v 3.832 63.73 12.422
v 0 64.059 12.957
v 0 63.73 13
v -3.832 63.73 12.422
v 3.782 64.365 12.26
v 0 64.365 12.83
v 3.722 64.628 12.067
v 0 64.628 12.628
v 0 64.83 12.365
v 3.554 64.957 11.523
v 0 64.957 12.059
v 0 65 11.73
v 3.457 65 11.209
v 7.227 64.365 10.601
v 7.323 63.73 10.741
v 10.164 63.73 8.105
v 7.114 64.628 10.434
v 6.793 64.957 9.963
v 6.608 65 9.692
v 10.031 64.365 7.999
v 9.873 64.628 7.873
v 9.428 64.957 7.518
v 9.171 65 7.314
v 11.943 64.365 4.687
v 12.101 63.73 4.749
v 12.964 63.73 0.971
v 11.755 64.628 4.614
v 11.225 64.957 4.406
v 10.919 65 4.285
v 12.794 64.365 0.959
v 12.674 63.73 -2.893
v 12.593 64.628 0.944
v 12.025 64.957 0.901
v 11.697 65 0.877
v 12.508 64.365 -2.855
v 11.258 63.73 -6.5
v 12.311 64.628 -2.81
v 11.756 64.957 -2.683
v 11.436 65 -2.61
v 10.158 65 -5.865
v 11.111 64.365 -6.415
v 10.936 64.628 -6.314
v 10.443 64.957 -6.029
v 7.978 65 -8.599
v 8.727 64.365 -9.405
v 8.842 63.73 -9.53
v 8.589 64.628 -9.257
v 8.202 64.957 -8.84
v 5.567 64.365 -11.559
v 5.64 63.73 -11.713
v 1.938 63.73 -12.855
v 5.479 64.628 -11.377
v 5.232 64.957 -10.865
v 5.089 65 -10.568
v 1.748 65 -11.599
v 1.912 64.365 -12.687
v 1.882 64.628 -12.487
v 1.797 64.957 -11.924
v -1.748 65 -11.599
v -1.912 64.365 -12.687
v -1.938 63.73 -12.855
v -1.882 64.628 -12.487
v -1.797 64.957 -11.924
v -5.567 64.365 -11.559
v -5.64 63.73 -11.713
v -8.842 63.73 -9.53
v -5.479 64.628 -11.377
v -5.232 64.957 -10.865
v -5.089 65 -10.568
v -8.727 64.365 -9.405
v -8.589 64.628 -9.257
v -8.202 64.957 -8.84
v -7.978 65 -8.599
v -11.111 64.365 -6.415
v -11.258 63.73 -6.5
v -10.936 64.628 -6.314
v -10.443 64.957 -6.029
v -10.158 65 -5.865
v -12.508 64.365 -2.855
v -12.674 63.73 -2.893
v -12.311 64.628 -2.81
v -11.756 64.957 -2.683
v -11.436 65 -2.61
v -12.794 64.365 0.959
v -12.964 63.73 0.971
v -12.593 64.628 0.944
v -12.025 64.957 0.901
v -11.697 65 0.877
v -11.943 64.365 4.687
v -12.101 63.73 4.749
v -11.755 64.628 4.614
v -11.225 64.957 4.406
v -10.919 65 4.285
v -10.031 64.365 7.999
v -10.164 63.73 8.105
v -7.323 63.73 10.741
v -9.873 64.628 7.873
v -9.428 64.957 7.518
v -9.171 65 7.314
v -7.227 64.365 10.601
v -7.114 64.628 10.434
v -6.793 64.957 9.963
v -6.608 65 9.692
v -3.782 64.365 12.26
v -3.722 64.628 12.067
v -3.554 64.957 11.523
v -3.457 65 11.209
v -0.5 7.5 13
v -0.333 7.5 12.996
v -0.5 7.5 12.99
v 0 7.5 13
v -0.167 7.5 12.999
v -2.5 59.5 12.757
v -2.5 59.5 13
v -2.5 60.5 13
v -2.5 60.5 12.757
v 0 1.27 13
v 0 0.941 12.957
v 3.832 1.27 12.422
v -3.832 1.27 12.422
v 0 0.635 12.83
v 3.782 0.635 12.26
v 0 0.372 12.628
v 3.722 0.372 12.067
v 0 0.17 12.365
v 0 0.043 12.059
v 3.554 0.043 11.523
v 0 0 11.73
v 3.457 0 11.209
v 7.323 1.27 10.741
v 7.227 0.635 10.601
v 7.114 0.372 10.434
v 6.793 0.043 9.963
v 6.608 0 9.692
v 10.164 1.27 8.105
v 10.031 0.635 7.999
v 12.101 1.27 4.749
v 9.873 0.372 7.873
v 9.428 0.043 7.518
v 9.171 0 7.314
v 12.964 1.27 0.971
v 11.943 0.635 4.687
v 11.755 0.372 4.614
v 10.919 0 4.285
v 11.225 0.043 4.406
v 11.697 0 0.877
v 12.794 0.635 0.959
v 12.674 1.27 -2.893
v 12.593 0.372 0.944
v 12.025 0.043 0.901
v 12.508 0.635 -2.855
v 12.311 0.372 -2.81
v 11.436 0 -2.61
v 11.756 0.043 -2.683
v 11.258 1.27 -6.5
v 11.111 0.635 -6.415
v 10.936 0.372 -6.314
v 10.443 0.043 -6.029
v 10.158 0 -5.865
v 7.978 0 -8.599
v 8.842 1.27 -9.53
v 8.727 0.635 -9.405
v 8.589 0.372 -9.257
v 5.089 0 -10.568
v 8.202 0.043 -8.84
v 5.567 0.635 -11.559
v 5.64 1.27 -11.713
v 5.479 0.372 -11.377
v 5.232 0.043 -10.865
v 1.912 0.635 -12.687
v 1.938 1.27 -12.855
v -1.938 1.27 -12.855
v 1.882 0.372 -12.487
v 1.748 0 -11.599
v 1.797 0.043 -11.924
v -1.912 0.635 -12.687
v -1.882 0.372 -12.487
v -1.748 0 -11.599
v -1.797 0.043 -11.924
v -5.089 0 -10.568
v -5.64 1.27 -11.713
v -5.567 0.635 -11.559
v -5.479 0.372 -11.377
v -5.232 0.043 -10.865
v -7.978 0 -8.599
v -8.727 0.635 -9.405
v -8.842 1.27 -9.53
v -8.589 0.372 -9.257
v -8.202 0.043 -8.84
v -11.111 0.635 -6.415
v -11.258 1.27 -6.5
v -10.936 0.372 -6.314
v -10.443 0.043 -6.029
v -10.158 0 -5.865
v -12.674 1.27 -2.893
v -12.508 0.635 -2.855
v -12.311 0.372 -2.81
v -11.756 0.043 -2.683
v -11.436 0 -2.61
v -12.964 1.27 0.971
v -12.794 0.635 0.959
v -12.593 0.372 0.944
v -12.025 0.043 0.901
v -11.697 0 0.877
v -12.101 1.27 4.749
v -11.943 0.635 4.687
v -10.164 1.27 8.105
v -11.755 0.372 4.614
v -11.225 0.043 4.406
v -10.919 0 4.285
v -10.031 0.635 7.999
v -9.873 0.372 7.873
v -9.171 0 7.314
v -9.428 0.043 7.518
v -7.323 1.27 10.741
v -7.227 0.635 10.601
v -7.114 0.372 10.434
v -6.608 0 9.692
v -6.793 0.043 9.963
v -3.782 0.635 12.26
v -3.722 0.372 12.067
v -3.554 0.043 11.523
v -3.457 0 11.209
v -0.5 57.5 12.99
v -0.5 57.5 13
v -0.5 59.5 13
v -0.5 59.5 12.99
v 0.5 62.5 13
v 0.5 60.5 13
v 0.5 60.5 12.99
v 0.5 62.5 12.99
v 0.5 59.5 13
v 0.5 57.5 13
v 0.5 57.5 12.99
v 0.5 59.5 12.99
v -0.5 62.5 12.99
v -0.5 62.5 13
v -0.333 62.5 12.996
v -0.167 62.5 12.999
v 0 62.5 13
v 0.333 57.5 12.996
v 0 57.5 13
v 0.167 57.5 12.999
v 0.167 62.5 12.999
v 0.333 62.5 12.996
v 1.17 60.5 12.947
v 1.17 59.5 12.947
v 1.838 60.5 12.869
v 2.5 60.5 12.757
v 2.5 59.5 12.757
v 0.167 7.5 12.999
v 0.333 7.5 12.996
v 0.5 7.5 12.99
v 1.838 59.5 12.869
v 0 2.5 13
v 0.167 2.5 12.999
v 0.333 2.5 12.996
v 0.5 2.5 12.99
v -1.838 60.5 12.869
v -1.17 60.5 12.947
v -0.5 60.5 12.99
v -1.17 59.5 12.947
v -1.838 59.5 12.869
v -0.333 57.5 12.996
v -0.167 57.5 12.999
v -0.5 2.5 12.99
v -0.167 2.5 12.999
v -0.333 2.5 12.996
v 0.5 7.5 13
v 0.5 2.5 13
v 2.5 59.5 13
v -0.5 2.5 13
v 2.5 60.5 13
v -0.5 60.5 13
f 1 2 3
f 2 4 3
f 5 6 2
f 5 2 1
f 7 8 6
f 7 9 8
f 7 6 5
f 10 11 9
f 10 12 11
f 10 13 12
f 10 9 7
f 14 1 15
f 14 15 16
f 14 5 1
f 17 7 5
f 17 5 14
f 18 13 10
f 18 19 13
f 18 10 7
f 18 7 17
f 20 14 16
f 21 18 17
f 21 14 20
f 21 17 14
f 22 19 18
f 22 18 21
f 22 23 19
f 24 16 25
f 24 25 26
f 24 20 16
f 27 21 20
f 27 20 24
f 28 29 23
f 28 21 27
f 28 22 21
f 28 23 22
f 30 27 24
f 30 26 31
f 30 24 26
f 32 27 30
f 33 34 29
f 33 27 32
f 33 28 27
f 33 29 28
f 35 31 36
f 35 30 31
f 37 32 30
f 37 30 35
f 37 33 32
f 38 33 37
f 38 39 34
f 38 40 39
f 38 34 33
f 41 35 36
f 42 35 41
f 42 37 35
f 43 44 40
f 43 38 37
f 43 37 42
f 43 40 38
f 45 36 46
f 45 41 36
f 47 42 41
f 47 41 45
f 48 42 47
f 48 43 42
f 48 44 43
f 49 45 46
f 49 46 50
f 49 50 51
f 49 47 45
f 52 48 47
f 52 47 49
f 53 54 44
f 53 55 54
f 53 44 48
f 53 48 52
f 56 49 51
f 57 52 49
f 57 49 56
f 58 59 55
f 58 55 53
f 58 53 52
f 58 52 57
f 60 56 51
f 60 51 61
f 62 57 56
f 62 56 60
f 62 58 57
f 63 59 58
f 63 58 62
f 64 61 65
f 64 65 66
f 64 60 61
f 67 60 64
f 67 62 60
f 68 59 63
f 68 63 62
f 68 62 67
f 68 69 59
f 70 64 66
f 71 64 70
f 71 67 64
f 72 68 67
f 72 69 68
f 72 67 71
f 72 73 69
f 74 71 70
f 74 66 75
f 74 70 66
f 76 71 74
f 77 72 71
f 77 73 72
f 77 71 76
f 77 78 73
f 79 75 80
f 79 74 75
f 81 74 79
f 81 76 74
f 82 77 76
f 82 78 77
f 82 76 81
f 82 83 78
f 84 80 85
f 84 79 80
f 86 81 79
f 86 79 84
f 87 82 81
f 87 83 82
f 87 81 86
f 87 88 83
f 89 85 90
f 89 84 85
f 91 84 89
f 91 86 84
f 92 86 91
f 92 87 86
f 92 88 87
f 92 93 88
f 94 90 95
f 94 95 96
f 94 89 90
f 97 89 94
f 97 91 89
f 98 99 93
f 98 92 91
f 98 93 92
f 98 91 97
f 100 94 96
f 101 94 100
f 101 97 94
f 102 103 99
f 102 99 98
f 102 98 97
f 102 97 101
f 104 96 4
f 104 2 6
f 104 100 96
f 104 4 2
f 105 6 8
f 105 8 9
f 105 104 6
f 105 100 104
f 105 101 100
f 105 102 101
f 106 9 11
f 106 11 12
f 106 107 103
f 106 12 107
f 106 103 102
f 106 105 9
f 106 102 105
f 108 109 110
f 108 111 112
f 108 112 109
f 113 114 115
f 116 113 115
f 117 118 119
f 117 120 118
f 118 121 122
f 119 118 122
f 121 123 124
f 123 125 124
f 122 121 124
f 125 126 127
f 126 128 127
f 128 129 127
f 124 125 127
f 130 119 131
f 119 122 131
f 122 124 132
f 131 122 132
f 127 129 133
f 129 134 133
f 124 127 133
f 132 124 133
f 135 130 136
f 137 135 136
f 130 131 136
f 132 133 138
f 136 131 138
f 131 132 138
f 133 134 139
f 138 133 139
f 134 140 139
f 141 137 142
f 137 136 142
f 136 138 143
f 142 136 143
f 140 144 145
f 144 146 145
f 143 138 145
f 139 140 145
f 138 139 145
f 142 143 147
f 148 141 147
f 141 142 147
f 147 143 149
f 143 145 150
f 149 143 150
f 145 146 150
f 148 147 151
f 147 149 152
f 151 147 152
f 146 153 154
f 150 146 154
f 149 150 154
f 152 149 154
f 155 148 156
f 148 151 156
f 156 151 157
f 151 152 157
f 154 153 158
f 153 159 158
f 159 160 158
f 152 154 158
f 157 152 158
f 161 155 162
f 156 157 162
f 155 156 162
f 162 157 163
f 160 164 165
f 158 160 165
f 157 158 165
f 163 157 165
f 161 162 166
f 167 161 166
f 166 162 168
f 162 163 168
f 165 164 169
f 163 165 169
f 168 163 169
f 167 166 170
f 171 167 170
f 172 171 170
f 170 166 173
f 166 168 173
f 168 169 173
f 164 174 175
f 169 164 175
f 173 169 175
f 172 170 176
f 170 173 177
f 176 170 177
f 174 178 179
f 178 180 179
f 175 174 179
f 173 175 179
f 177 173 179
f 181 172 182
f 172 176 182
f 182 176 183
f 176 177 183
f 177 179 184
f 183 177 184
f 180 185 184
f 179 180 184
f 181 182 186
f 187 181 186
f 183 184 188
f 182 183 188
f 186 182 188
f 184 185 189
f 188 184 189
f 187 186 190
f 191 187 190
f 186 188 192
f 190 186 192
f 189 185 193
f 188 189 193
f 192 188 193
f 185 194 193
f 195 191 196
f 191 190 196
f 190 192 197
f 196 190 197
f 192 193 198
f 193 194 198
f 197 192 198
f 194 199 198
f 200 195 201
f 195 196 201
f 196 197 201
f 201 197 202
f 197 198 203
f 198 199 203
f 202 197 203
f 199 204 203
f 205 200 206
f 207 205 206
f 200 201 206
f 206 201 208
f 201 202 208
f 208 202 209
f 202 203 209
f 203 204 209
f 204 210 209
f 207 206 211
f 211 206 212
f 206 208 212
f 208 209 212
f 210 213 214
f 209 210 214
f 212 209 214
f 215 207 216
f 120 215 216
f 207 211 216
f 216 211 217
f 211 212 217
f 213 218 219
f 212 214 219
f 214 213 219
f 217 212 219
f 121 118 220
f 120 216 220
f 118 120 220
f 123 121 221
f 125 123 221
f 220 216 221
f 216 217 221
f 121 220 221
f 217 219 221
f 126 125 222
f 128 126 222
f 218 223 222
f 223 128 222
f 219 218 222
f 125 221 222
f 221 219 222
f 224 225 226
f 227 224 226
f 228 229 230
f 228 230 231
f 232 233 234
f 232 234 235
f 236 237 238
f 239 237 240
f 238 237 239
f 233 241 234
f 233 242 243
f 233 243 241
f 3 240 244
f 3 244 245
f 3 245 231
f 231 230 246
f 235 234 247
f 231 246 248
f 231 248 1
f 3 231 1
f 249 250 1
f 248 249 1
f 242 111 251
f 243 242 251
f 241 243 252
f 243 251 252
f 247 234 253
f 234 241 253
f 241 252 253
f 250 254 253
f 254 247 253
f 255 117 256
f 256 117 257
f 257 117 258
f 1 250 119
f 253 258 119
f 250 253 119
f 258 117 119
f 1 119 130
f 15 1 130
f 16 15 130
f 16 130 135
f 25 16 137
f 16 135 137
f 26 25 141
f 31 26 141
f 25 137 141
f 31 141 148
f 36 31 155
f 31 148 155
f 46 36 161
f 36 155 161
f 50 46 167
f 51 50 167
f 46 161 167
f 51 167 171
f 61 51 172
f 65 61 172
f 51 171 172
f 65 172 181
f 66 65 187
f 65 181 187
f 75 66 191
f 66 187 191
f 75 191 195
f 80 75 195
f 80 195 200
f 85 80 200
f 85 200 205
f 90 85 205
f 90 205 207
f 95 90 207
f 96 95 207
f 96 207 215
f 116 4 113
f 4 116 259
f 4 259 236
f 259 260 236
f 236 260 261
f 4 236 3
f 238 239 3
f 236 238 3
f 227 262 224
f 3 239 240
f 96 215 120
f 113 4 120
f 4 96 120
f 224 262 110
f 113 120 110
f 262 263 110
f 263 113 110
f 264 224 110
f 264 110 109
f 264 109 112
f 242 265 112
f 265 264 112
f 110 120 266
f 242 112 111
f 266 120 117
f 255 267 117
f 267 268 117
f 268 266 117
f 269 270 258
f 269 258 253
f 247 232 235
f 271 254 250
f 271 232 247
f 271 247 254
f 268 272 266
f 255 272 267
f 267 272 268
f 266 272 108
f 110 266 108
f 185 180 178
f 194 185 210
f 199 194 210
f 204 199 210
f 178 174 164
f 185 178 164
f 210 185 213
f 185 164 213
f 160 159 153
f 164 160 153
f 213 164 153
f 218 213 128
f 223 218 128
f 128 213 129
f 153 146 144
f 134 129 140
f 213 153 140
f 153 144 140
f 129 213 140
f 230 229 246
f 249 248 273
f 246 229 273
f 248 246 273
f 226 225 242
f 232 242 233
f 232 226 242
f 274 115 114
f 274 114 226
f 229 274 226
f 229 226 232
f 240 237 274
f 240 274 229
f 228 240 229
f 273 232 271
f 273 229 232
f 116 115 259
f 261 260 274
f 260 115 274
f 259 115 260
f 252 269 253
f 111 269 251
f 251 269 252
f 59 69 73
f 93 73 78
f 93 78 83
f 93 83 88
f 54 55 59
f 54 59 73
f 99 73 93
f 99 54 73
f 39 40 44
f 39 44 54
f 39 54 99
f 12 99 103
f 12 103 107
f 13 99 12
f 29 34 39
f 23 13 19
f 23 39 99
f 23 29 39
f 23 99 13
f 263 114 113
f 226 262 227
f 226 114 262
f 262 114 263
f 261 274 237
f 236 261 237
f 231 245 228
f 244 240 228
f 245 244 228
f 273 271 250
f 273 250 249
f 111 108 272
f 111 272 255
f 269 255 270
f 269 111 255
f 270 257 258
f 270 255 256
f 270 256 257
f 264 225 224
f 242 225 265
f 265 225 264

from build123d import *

# Parameters (mm, degrees)
SKETCH1_R           = 13
BOSS_EXTRUDE1_DEPTH = 65
FILLET1_R           = 1.27
FILLET2_R           = 1.27
SKETCH2_W           = 0.5
SKETCH2_H           = 5
SKETCH2_W_2         = 1
SKETCH2_W_3         = 5
SKETCH2_H_2         = 1
BOSS_EXTRUDE2_DEPTH = 10


with BuildPart() as part:
    # Sketch1 → Boss-Extrude1 (new body)
    with BuildSketch(Plane(origin=(0, 0, 0), x_dir=(1, 0, 0), z_dir=(0, 1, 0))):
        with Locations(Location((0, 0, 0), (0, 0, 270))):
            Circle(SKETCH1_R)
    extrude(amount=BOSS_EXTRUDE1_DEPTH)

    # Fillet1
    fillet1_edges = [part.edges().sort_by_distance(p)[0] for p in [
        (0, 65, -13),
    ]]
    fillet(fillet1_edges, radius=FILLET1_R)

    # Fillet2
    fillet2_edges = [part.edges().sort_by_distance(p)[0] for p in [
        (0, 0, -13),
    ]]
    fillet(fillet2_edges, radius=FILLET2_R)

    # Sketch2 → Boss-Extrude2 (add)
    with BuildSketch(Plane.XY.offset(13)):
        with Locations((-0.25, 5)):
            Rectangle(SKETCH2_W, SKETCH2_H)
        with Locations((0.25, 5)):
            Rectangle(SKETCH2_W, SKETCH2_H)
        with Locations((0, 60)):
            Rectangle(SKETCH2_W_2, SKETCH2_H)
        with Locations((0, 60)):
            Rectangle(SKETCH2_W_3, SKETCH2_H_2)
    extrude(amount=-BOSS_EXTRUDE2_DEPTH)


solid = part.part
